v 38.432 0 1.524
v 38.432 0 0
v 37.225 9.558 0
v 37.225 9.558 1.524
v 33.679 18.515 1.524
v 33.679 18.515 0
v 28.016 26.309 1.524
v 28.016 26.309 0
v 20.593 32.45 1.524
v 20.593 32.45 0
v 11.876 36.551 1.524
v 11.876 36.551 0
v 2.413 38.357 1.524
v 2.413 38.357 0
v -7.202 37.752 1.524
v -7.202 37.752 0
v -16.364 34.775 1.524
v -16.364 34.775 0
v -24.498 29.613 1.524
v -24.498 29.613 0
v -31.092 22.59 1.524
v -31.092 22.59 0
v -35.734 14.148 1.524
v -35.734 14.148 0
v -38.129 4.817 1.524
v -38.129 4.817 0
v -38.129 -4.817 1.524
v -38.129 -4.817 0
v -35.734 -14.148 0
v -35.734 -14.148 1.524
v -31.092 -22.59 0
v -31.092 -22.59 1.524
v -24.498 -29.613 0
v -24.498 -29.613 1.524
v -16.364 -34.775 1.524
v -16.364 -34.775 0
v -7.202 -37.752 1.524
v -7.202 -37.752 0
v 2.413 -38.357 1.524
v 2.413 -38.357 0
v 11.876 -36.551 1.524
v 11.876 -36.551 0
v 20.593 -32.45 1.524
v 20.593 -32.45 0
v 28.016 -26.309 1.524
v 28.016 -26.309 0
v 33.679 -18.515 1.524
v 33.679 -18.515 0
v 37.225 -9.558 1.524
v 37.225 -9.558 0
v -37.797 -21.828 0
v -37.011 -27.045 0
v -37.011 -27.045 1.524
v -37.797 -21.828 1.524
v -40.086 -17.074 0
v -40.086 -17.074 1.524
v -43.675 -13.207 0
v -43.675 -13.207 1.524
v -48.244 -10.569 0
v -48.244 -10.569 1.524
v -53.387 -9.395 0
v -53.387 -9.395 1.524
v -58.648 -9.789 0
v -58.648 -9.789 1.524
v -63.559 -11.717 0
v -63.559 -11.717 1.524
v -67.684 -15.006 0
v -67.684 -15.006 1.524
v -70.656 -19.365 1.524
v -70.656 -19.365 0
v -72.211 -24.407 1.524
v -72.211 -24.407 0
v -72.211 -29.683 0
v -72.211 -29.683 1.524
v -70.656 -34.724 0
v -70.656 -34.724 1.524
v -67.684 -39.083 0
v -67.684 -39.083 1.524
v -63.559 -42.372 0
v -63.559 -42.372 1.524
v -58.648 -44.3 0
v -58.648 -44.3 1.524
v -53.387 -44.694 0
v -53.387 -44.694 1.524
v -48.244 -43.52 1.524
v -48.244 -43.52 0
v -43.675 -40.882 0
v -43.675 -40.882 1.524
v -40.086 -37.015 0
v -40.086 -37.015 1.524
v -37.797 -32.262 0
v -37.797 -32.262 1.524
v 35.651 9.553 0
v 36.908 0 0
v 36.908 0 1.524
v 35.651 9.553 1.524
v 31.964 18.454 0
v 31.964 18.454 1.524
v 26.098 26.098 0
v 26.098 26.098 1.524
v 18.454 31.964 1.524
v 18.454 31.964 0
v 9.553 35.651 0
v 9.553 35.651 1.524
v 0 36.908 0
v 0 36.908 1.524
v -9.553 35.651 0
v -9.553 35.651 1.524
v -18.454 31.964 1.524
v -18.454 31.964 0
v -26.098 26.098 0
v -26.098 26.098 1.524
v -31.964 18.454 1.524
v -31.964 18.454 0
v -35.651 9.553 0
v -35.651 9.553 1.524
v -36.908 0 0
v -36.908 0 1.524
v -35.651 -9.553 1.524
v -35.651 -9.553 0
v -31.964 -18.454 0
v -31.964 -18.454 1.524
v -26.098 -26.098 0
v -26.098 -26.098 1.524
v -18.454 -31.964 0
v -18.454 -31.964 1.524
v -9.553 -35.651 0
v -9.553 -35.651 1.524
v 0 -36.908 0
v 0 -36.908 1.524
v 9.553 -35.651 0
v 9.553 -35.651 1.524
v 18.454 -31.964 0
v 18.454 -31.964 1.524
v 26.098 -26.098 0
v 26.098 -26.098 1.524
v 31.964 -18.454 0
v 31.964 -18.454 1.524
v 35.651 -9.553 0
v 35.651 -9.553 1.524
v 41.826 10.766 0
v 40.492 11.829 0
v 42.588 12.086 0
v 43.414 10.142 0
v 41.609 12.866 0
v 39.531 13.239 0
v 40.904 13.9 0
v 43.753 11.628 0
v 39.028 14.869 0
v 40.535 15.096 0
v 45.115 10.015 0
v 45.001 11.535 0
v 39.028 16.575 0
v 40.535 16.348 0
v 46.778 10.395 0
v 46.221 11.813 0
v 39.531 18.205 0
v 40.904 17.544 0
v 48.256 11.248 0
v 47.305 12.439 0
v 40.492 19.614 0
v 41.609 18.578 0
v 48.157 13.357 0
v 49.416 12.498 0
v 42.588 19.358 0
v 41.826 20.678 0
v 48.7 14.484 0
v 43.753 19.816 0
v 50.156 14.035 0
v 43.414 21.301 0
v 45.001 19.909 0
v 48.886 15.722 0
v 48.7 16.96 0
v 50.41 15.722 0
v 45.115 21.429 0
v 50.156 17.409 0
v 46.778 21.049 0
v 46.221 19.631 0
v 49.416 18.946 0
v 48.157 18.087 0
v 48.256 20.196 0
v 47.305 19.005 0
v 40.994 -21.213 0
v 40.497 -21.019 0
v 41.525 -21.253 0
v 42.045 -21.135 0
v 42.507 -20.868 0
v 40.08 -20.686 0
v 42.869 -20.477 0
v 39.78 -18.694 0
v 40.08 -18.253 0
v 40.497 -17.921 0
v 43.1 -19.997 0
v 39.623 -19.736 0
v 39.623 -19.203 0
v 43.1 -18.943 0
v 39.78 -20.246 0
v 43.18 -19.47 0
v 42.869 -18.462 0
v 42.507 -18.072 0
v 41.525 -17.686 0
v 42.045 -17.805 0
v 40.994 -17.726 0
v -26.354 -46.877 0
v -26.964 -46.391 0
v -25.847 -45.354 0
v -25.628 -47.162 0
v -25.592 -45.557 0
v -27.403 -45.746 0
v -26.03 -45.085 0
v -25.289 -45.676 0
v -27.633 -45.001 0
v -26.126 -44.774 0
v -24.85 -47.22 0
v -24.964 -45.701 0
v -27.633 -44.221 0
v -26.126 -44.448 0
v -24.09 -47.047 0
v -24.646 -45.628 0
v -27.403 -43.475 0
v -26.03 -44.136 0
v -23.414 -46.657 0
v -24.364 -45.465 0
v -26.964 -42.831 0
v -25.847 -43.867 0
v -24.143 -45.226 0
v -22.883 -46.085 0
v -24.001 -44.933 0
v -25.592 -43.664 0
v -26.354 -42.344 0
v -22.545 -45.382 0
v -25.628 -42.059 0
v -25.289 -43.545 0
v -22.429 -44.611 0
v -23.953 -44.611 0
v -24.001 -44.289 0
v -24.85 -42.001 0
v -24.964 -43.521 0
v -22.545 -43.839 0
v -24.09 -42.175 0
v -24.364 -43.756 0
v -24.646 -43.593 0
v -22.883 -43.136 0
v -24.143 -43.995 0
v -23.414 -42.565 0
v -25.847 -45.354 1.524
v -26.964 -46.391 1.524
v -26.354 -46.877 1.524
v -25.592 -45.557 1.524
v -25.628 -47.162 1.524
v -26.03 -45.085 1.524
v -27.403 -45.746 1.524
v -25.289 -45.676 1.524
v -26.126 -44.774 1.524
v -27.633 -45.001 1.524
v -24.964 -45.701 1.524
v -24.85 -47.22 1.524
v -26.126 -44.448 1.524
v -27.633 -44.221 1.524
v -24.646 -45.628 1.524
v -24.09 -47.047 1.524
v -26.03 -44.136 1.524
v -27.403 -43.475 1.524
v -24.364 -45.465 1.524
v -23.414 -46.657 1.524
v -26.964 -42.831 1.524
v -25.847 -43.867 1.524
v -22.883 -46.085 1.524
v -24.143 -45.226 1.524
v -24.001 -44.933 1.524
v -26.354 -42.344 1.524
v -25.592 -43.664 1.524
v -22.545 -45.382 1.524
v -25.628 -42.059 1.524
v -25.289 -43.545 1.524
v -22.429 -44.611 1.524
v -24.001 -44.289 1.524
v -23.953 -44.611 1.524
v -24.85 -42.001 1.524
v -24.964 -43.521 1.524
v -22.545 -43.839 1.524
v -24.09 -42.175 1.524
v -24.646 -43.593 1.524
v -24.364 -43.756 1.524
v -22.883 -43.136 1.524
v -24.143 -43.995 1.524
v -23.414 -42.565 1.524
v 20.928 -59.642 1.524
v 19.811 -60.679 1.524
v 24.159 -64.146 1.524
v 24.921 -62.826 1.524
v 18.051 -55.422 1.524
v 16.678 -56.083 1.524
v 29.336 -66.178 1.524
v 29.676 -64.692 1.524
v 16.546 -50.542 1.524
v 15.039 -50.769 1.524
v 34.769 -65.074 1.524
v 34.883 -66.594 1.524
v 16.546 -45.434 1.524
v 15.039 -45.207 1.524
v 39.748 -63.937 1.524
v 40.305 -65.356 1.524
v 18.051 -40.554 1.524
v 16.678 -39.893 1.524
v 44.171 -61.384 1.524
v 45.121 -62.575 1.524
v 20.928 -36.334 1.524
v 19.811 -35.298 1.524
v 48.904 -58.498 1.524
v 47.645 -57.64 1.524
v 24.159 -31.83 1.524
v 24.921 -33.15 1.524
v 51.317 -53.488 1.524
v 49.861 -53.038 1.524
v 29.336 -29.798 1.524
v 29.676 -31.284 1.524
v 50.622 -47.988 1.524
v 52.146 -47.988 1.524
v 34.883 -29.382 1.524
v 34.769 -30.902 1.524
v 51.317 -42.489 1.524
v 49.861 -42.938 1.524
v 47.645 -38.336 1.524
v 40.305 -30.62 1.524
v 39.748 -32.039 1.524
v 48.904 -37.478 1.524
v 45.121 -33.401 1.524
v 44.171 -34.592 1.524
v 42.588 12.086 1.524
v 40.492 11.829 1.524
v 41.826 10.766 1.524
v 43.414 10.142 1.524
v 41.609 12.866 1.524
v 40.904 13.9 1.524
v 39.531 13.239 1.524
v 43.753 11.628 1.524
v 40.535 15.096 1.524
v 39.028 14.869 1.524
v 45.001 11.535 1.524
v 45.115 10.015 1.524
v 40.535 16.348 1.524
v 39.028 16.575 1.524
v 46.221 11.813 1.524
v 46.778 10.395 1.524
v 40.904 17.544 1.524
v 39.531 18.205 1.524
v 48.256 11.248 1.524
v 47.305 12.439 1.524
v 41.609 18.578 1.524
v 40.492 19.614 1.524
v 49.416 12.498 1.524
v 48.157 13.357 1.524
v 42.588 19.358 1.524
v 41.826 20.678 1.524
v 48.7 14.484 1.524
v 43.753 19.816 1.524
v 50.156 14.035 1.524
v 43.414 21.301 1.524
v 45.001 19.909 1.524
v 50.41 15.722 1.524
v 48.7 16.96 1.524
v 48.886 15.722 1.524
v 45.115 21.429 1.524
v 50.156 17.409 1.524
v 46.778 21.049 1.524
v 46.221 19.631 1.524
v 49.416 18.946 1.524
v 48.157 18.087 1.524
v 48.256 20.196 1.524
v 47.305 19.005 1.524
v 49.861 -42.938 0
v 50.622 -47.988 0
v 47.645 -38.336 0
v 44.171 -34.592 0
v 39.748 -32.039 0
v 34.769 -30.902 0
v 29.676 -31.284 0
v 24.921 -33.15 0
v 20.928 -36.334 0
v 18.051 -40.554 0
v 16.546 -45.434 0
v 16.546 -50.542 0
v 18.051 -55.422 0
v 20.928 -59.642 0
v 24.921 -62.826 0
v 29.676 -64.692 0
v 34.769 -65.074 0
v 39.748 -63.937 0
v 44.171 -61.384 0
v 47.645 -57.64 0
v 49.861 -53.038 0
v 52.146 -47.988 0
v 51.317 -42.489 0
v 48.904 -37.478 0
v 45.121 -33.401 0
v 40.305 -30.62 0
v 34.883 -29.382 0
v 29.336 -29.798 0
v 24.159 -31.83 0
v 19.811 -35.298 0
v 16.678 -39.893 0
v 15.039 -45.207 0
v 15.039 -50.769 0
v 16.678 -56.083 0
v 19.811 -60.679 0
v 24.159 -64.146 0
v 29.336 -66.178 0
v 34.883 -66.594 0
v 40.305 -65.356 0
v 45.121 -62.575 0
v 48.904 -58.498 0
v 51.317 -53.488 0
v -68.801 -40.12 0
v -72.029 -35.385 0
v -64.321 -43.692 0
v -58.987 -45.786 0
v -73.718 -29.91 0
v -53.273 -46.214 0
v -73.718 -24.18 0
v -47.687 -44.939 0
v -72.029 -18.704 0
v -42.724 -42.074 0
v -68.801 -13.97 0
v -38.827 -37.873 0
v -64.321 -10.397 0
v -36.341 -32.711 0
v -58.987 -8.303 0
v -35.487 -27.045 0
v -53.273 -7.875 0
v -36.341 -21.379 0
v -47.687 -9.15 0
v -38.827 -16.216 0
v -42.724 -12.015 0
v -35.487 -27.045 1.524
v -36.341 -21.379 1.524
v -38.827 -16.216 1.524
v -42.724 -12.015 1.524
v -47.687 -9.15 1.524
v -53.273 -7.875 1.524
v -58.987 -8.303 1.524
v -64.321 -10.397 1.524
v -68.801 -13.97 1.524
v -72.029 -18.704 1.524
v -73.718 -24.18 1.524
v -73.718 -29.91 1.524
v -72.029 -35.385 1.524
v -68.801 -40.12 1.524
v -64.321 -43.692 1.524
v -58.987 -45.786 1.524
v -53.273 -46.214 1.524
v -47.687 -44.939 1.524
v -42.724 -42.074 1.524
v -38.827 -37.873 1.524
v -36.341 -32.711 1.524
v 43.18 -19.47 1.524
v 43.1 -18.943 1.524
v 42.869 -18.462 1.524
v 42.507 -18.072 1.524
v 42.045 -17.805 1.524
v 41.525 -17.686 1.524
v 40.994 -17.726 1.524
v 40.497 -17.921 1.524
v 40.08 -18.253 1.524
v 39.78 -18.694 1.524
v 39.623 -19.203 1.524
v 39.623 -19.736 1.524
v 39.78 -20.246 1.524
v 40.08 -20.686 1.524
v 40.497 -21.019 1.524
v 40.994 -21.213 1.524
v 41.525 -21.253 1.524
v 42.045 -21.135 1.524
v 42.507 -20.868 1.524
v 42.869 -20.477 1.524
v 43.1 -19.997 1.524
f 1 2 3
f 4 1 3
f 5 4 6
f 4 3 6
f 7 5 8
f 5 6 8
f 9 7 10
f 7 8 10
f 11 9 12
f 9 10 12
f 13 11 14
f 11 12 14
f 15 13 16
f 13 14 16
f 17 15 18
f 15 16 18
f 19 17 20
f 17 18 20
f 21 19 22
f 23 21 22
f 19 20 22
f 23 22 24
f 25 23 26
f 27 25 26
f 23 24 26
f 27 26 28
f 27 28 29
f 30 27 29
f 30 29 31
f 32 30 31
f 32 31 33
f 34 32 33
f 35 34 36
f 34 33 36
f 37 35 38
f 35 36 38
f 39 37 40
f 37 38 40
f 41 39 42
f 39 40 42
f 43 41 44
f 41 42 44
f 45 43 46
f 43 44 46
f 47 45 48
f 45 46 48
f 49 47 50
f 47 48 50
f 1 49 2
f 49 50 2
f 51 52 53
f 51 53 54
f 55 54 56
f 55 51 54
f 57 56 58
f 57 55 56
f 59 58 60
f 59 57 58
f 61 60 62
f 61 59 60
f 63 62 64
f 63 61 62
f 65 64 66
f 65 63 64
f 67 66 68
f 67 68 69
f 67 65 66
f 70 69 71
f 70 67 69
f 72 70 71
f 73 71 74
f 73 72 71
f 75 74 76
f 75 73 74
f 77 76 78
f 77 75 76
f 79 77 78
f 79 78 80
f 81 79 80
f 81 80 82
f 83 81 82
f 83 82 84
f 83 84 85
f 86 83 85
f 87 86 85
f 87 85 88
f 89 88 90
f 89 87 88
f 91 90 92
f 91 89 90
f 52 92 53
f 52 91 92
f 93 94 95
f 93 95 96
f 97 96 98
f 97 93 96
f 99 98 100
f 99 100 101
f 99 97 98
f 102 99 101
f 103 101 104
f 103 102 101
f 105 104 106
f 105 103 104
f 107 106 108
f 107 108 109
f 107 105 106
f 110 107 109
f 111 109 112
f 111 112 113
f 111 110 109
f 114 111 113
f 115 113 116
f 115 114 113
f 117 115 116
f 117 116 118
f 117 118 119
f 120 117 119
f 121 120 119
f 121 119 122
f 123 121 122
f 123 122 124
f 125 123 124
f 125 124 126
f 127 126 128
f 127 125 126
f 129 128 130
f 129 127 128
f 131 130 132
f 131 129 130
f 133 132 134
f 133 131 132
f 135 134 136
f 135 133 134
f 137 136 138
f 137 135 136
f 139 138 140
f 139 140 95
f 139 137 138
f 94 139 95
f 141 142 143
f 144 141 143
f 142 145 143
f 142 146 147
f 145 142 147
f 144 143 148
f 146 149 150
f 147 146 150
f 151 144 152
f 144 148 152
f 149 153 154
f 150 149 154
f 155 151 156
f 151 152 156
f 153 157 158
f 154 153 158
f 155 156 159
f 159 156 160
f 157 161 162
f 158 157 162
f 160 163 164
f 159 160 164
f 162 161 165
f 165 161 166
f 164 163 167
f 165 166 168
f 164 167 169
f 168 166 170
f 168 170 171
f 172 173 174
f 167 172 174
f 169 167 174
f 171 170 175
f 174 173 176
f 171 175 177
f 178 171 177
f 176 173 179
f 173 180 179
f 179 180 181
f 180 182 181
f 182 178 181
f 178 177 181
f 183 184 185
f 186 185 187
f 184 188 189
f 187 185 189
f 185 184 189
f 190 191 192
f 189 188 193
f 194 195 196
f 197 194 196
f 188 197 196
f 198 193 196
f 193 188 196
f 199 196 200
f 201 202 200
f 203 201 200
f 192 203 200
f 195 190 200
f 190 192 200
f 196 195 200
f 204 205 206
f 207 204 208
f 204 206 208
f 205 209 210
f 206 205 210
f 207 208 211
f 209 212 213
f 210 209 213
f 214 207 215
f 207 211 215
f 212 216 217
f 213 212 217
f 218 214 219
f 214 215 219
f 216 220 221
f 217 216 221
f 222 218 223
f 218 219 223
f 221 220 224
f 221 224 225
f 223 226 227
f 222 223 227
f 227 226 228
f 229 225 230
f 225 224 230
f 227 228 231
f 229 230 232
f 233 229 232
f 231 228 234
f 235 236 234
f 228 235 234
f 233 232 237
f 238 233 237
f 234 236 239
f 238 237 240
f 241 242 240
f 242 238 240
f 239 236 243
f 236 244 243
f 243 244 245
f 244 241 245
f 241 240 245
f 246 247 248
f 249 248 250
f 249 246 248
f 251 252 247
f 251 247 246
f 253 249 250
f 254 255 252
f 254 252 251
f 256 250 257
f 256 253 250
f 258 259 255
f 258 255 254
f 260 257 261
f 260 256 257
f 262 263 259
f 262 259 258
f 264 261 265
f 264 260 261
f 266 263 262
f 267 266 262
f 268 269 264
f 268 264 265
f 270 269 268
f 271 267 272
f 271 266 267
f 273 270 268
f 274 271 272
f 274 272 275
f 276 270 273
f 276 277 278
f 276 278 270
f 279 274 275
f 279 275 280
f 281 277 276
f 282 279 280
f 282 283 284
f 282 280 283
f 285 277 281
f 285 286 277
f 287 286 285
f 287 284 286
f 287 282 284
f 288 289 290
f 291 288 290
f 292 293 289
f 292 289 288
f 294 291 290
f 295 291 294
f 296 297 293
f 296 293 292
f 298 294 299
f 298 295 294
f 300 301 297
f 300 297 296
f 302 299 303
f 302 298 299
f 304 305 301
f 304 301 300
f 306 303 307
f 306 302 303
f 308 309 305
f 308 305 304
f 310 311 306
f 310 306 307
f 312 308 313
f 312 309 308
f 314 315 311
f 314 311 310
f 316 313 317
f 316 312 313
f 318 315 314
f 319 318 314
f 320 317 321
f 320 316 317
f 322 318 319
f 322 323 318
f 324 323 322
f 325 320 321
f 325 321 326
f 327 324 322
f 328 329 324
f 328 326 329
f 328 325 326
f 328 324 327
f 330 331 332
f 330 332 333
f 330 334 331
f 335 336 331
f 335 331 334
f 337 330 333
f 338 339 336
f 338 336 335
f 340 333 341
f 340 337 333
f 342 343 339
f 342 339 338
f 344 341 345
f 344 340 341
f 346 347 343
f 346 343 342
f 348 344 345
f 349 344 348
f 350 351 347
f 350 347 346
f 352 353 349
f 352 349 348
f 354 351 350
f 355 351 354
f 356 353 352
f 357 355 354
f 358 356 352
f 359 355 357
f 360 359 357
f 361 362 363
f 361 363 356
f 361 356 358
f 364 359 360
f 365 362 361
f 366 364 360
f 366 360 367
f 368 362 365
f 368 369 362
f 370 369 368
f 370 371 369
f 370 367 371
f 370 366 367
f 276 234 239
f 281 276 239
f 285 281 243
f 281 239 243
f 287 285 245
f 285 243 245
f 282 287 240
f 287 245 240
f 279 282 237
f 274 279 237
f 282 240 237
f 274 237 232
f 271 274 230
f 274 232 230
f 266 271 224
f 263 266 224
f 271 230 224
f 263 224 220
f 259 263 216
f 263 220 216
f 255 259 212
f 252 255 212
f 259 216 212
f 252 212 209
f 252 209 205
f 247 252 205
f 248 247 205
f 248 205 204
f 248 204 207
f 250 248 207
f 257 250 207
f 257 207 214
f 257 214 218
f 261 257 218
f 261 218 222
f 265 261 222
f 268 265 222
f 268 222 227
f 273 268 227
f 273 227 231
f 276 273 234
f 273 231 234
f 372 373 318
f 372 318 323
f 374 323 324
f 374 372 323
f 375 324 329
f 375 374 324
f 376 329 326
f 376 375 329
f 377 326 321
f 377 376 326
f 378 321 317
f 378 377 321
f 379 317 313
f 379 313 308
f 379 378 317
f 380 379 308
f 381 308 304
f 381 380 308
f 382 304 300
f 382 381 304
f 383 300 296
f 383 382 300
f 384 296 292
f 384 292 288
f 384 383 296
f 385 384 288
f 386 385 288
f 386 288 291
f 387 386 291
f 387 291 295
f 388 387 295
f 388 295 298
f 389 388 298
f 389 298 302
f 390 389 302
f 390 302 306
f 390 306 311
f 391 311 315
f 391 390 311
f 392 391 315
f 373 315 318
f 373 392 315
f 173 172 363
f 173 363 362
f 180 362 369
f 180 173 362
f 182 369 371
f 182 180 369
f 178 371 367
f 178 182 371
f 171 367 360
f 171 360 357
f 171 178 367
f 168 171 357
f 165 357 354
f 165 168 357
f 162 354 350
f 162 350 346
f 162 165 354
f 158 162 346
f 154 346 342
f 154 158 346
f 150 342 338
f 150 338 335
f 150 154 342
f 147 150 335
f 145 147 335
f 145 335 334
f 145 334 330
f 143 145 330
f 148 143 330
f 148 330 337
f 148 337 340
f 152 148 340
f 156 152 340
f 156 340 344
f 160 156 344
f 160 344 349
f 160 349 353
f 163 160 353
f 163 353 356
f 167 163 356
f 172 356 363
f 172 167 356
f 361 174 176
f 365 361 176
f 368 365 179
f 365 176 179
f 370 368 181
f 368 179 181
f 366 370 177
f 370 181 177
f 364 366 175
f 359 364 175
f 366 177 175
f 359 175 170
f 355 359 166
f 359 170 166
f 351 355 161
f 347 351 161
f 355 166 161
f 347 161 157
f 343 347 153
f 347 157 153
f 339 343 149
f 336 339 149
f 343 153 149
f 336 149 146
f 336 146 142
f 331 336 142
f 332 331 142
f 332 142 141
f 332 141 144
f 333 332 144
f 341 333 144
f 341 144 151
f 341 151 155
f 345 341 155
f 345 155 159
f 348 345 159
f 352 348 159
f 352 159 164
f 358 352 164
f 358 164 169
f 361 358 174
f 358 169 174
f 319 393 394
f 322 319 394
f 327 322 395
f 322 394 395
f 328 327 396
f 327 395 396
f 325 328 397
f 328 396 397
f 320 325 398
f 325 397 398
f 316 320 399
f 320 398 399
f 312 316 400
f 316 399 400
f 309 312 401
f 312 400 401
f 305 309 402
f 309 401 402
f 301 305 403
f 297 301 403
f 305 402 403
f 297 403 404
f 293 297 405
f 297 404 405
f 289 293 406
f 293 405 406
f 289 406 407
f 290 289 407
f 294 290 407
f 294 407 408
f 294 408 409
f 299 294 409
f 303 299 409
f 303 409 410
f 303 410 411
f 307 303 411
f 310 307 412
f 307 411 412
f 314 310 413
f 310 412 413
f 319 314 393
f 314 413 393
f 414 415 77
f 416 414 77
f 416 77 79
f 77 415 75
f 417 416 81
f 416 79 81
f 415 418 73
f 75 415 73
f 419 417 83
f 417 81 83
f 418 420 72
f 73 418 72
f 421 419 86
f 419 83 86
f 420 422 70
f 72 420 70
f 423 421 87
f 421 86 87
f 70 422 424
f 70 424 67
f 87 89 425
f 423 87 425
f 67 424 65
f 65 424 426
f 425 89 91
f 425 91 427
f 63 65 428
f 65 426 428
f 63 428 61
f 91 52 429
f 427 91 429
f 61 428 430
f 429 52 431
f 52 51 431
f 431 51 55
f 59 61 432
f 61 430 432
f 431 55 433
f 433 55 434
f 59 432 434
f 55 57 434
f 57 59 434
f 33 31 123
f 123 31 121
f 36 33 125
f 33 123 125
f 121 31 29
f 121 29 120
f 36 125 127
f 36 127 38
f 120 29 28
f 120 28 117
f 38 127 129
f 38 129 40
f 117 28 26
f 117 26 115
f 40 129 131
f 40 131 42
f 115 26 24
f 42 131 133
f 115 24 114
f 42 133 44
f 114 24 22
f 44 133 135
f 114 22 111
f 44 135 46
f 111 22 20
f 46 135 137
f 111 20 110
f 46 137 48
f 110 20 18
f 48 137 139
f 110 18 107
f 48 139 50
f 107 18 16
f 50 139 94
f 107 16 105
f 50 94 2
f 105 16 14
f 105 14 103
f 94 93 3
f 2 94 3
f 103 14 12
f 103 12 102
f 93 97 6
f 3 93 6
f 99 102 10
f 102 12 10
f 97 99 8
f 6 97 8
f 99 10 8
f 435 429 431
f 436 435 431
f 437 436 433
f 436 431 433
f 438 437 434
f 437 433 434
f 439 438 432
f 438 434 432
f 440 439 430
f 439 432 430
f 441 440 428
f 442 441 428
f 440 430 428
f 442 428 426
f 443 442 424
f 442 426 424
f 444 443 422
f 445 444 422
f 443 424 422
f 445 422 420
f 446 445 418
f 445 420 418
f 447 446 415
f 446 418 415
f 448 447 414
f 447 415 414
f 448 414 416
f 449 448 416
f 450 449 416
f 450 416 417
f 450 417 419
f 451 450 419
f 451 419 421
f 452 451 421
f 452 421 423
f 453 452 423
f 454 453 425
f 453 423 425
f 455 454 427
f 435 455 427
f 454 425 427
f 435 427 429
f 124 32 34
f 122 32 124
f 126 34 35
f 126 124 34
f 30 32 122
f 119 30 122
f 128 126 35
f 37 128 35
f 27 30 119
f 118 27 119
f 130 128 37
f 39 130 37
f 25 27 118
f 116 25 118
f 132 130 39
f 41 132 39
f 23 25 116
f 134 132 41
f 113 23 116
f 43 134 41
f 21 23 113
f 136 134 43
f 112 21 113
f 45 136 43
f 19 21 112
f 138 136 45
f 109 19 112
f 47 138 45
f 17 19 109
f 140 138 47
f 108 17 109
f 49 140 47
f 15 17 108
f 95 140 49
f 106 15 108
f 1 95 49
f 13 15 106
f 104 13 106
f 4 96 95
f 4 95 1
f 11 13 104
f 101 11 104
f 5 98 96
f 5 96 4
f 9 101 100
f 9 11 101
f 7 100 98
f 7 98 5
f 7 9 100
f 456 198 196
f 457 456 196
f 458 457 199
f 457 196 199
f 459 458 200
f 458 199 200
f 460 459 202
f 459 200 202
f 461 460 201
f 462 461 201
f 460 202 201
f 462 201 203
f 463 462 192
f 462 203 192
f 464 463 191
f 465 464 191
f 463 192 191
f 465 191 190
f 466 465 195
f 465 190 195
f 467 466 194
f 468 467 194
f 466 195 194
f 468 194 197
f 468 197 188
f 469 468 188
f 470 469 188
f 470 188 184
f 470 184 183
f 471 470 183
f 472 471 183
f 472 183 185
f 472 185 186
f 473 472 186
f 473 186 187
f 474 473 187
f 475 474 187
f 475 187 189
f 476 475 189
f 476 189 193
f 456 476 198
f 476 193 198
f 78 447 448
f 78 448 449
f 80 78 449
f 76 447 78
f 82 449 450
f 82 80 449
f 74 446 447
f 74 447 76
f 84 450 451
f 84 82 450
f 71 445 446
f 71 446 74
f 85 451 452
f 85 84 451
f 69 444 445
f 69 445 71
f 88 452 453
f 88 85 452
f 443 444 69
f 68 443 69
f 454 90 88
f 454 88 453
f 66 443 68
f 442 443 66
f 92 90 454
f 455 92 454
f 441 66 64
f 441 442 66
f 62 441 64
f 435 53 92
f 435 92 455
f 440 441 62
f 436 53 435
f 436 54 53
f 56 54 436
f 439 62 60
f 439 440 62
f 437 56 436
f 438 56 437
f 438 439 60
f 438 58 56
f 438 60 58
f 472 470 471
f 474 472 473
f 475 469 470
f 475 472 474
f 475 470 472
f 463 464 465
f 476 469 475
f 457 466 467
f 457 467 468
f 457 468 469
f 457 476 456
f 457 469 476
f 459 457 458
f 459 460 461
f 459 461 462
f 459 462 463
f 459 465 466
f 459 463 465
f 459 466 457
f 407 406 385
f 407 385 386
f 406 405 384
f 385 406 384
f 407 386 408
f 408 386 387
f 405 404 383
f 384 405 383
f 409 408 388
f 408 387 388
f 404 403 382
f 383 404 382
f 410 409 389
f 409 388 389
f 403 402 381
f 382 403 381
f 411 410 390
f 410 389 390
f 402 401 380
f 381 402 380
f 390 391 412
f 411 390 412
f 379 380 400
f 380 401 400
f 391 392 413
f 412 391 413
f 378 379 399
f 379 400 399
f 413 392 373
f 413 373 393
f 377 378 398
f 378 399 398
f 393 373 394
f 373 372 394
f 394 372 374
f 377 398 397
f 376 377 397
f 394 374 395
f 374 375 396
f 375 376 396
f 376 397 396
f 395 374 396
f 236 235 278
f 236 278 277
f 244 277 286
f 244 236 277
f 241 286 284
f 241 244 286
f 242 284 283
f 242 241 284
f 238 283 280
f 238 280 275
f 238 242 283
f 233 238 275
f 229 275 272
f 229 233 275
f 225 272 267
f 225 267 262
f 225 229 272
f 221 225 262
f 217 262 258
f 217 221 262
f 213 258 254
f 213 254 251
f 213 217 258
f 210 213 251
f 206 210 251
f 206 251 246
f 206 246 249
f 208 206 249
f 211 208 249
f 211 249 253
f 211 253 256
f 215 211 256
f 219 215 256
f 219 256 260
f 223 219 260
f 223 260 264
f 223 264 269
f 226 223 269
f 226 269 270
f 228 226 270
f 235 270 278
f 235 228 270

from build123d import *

# Parameters (mm, degrees)
F0_R     = 2.616988
F0_R_2   = 1.092988
F0_R_3   = 5.722914
F0_R_4   = 4.198914
F0_R_5   = 1.788436
F0_R_6   = 38.432366
F0_R_7   = 36.908366
F0_R_8   = 19.223085
F0_R_9   = 17.699085
F0_R_10  = 18.65776
F0_R_11  = 17.13376
F1_DEPTH = 1.524


with BuildPart() as f1:
    # F0 (on Top) → F1 (new body)
    with BuildSketch(Plane.XY):
        with Locations((-25.045646, -44.610664)):
            Circle(F0_R)
        with Locations((-25.045646, -44.610664)):
            Circle(F0_R_2, mode=Mode.SUBTRACT)
        with Locations((44.687416, 15.721921)):
            Circle(F0_R_3)
        with Locations((44.687416, 15.721921)):
            Circle(F0_R_4, mode=Mode.SUBTRACT)
        with Locations((41.391484, -19.469855)):
            Circle(F0_R_5)
        Circle(F0_R_6)
        Circle(F0_R_7, mode=Mode.SUBTRACT)
        with Locations((-54.709774, -27.044611)):
            Circle(F0_R_8)
        with Locations((-54.709774, -27.044611)):
            Circle(F0_R_9, mode=Mode.SUBTRACT)
        with Locations((33.48821, -47.988053)):
            Circle(F0_R_10)
        with Locations((33.48821, -47.988053)):
            Circle(F0_R_11, mode=Mode.SUBTRACT)
    extrude(amount=F1_DEPTH)


solid = f1.part
